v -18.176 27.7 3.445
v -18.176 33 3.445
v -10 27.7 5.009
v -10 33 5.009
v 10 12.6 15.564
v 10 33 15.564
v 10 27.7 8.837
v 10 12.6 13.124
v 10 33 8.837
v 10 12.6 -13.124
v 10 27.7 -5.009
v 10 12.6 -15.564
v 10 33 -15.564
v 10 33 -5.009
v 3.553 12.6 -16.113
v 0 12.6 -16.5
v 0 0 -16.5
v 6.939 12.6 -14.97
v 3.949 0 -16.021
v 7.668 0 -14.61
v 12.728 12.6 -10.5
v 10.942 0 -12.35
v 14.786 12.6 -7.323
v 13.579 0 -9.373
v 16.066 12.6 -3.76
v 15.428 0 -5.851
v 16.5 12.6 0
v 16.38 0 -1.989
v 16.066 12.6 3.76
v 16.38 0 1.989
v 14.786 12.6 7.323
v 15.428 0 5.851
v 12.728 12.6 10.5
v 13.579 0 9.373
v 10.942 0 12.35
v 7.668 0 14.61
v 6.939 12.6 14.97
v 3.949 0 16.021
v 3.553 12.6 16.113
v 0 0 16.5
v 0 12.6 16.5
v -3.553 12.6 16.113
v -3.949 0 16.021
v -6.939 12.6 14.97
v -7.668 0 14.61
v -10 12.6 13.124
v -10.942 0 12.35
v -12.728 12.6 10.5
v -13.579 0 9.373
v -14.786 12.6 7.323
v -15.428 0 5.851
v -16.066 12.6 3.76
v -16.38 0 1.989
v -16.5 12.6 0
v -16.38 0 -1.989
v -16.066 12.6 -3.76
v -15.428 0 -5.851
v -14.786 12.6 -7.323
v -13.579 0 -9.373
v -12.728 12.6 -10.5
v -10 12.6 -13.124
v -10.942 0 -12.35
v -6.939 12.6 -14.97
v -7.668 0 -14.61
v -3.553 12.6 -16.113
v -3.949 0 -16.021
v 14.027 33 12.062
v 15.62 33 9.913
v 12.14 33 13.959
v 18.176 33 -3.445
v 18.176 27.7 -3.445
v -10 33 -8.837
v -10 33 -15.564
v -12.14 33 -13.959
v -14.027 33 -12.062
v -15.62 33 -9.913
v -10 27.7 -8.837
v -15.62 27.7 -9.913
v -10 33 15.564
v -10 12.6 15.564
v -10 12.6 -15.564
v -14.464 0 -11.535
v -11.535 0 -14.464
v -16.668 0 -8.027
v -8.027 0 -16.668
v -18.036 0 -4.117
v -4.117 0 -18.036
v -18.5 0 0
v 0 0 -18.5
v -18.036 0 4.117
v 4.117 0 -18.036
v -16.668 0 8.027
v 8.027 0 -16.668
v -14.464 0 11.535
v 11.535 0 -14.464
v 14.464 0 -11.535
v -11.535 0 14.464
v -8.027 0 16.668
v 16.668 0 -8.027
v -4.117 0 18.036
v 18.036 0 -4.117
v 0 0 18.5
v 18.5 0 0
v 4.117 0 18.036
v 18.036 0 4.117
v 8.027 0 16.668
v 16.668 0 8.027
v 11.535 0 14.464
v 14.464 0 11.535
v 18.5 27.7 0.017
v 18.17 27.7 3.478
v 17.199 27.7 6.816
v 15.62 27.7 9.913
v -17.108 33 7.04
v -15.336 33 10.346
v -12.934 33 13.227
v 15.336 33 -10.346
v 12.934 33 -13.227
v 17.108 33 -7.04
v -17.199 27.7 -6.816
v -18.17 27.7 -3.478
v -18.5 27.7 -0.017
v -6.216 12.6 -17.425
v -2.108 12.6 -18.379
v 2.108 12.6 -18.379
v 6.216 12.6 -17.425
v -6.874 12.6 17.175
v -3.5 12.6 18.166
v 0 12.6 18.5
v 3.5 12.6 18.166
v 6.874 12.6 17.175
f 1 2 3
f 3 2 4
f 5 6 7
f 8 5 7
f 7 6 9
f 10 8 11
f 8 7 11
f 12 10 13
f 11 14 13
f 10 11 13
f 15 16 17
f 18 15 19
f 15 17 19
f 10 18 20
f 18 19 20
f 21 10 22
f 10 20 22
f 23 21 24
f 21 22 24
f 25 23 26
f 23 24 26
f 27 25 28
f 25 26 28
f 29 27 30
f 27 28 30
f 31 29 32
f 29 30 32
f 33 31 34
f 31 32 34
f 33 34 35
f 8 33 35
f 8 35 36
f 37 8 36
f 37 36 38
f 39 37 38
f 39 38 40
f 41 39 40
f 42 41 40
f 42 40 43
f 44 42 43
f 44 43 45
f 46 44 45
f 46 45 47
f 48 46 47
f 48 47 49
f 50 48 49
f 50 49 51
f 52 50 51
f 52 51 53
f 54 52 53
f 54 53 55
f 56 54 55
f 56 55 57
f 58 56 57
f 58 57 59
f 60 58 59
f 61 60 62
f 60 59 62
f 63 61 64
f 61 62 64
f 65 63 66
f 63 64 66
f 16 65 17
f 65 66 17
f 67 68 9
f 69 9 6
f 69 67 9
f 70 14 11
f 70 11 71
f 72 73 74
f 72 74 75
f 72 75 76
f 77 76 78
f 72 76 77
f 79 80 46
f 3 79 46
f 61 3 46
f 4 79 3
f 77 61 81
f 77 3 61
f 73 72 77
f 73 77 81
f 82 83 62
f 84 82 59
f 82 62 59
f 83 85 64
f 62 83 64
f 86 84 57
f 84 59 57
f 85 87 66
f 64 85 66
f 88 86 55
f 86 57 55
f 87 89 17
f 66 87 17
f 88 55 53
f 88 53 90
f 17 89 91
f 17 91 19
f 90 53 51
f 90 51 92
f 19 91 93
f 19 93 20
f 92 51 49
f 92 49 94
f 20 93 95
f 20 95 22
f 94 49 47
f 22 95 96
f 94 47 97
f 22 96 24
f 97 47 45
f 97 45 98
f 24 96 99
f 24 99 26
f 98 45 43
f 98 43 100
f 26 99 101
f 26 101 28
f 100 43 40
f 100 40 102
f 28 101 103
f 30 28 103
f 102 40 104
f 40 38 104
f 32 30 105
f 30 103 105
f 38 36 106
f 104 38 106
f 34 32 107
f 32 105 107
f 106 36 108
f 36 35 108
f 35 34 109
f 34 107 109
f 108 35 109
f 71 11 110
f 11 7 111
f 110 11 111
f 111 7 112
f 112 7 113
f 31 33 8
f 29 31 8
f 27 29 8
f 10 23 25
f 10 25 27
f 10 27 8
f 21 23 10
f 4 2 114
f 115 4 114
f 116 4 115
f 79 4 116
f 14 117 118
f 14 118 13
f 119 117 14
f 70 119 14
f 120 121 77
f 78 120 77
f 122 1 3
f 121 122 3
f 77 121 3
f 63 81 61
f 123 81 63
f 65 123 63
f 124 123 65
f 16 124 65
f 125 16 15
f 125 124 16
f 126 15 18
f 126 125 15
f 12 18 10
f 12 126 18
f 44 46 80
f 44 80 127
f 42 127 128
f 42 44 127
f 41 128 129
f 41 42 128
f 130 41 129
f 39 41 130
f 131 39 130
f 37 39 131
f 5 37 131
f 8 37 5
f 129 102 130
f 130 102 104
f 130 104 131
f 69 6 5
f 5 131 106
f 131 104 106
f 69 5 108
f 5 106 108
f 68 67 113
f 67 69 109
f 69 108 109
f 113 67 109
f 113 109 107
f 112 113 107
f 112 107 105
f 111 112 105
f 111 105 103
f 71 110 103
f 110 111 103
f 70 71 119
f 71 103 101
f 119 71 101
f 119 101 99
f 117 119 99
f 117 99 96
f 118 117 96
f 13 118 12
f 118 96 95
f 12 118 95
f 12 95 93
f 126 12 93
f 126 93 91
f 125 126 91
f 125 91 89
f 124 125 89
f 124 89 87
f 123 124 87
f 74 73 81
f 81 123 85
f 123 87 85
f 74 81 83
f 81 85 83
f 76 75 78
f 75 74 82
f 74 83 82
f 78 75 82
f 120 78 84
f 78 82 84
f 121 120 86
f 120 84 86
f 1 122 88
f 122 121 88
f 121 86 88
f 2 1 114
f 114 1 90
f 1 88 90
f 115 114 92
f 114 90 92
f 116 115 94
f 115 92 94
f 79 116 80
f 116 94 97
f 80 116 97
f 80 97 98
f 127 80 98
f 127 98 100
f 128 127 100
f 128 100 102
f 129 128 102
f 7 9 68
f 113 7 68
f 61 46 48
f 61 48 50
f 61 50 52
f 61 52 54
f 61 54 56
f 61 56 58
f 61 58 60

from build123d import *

# Parameters (mm, degrees)
SKETCH1_R           = 18.5
BOSS_EXTRUDE1_DEPTH = 33
SKETCH4_R           = 16.5
CUT_EXTRUDE3_DEPTH  = 12.6
SKETCH5_W           = 20
SKETCH5_H           = 49.349350968
CUT_EXTRUDE4_DEPTH  = 20.4
SKETCH7_W           = 56.502792025
SKETCH7_H           = 7.03676062
CUT_EXTRUDE5_DEPTH  = 6.8


with BuildPart() as part:
    # Sketch1 → Boss-Extrude1 (new body)
    with BuildSketch(Plane(origin=(0, 0, 0), x_dir=(1, 0, 0), z_dir=(0, 1, 0))):
        with Locations(Location((0, 0, 0), (0, 0, 270))):
            Circle(SKETCH1_R)
    extrude(amount=BOSS_EXTRUDE1_DEPTH)

    # Sketch4 → Cut-Extrude3 (cut)
    with BuildSketch(Plane.XZ):
        with Locations(Location((0, 0, 0), (0, 0, 270))):
            Circle(SKETCH4_R)
    extrude(amount=-CUT_EXTRUDE3_DEPTH, mode=Mode.SUBTRACT)

    # Sketch5 → Cut-Extrude4 (cut)
    with BuildSketch(Plane(origin=(0, 33, 0), x_dir=(1, 0, 0), z_dir=(0, 1, 0))):
        Rectangle(SKETCH5_W, SKETCH5_H)
    extrude(amount=-CUT_EXTRUDE4_DEPTH, mode=Mode.SUBTRACT)

    # Sketch7 → Cut-Extrude5 (cut, symmetric)
    with BuildSketch(Plane(origin=(0, 0, 0), x_dir=(0.9821726027310876, 0, 0.1879813247225403), z_dir=(-0.1879813247225403, 0, 0.9821726027310876))):
        with Locations((-1.059105512, 31.21838031)):
            Rectangle(SKETCH7_W, SKETCH7_H)
    extrude(amount=CUT_EXTRUDE5_DEPTH, both=True, mode=Mode.SUBTRACT)


solid = part.part
